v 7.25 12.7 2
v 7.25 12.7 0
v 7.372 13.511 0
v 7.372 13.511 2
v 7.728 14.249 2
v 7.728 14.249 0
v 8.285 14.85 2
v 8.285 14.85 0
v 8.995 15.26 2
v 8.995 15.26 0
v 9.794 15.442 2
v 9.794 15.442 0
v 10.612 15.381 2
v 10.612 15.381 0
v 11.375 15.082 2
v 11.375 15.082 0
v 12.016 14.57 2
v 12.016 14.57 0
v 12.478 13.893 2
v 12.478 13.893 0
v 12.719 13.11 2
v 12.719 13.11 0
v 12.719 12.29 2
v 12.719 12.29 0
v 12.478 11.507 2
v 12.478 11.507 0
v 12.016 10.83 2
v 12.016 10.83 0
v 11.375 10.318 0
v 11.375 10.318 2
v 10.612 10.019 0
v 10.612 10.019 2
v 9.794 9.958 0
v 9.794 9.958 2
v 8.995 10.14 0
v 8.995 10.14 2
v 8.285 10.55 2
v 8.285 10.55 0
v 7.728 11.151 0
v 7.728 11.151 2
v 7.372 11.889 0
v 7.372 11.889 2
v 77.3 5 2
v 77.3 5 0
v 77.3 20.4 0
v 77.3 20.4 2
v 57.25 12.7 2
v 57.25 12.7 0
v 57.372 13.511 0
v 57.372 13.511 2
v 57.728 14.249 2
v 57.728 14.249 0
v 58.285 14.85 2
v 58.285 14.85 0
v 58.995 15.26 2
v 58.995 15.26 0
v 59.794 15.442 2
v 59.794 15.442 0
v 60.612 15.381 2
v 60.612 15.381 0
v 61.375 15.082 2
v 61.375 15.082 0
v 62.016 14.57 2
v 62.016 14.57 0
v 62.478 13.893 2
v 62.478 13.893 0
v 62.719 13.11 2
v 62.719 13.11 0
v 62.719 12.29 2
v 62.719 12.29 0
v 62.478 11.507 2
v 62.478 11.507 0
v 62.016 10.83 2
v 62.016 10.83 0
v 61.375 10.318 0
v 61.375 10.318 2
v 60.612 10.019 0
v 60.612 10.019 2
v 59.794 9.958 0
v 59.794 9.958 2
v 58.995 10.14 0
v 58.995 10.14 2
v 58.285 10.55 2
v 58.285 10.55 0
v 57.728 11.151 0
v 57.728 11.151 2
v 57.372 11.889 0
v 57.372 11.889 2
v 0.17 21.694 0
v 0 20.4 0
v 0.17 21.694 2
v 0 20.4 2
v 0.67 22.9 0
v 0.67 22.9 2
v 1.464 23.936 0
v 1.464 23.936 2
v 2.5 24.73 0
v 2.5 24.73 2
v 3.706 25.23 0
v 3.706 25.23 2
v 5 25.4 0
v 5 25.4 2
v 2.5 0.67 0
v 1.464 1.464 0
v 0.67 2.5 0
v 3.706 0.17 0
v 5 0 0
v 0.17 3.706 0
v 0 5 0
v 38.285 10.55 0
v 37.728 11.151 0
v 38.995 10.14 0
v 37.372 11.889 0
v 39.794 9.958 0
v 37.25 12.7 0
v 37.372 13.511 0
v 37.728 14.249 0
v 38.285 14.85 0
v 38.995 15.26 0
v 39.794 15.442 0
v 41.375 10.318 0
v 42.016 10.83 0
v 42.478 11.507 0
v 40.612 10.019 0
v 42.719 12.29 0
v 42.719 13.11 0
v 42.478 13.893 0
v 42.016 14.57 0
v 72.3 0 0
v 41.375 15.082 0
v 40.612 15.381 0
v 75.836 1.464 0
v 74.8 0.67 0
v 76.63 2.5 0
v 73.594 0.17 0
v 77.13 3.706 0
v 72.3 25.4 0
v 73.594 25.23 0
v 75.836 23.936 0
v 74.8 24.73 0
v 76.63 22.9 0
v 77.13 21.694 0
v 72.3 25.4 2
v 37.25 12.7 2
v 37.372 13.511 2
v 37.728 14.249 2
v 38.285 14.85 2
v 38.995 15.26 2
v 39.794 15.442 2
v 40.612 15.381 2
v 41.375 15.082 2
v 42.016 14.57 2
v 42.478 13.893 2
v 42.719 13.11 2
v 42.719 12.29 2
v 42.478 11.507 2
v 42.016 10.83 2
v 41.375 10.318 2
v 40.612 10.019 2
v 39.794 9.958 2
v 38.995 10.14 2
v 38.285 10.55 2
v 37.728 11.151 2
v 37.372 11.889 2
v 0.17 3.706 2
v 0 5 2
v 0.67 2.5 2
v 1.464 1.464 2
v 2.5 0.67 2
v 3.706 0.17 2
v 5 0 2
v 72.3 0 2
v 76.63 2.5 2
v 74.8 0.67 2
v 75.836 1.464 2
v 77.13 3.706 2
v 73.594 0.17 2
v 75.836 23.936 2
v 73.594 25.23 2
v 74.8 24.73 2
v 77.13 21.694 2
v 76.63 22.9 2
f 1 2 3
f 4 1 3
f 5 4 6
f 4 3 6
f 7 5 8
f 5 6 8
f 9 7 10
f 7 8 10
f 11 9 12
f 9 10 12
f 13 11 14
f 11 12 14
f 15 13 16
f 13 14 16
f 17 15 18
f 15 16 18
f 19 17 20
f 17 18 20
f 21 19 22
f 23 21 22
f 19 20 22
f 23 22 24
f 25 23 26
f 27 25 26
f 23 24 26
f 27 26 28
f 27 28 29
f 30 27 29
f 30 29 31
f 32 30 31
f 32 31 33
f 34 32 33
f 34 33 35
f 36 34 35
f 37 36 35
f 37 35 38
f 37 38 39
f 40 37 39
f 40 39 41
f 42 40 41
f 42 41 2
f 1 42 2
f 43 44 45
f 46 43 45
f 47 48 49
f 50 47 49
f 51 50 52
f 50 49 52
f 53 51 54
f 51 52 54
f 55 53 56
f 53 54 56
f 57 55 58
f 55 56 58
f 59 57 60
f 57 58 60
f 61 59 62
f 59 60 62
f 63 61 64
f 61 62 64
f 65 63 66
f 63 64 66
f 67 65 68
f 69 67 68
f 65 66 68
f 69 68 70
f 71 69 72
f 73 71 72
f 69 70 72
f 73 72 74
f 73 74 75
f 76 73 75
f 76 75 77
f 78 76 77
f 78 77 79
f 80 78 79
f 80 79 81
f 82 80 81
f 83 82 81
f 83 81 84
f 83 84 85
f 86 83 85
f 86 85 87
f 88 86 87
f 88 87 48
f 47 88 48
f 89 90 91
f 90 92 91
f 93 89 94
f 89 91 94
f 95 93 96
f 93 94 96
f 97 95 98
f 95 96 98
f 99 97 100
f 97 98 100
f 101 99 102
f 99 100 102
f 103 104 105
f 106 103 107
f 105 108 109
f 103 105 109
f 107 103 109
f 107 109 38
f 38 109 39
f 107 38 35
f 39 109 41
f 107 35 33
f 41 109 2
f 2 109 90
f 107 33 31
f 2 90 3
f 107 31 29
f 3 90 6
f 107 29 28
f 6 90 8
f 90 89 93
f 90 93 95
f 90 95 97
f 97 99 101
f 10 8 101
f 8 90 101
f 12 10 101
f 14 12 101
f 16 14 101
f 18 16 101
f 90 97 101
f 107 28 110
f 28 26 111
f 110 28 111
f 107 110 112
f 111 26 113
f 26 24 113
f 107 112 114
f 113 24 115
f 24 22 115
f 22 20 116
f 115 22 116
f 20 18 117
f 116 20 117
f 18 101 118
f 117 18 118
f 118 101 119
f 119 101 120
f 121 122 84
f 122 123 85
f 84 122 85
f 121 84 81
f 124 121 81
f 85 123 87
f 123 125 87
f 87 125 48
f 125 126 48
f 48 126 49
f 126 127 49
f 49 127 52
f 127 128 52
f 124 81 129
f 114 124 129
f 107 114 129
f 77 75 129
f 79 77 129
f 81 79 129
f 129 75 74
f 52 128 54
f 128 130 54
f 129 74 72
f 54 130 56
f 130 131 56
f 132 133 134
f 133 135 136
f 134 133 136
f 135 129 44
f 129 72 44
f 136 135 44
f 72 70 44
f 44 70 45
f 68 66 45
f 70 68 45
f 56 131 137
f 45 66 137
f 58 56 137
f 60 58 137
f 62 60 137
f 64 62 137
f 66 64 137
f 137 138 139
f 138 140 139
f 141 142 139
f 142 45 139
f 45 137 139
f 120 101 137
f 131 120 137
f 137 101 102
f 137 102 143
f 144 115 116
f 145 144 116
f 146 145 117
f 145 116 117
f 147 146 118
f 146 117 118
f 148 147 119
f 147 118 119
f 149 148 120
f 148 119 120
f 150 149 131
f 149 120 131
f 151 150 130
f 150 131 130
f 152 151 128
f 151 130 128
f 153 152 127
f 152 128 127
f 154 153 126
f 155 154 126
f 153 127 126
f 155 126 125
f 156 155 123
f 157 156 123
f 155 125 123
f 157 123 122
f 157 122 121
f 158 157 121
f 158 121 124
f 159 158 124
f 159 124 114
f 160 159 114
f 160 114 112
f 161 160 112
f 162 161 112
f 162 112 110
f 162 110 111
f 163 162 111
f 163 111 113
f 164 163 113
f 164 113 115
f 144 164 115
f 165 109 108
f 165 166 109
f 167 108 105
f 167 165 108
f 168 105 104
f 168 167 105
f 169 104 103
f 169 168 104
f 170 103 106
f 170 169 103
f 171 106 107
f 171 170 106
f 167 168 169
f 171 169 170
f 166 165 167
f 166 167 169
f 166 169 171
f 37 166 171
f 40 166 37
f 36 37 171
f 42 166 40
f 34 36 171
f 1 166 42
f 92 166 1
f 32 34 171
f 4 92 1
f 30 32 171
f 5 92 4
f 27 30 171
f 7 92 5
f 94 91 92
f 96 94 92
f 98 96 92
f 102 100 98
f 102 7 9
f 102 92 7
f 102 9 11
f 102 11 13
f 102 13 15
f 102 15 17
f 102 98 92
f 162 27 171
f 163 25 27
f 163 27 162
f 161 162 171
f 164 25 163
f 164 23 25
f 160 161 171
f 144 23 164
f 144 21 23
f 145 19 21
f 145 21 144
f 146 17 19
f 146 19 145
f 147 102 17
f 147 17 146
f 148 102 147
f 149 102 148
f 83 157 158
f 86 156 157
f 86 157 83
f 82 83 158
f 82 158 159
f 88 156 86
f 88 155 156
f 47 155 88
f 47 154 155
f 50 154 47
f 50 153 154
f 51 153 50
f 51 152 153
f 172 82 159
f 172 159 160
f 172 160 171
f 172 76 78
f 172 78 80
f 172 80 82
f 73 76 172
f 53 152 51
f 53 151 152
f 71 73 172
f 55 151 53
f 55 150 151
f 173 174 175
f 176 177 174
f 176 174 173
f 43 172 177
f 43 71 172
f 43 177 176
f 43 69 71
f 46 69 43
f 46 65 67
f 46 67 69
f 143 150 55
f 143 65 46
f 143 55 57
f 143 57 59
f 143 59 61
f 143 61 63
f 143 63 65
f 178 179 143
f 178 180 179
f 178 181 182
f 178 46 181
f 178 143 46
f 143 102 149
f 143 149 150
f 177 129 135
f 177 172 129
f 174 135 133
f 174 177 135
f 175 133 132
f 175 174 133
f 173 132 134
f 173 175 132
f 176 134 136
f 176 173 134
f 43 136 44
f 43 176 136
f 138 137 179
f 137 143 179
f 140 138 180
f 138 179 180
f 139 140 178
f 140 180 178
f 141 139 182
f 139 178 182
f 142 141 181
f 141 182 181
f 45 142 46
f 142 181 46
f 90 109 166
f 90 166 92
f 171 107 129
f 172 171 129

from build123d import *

# Parameters (mm, degrees)
F0_W     = 77.3
F0_H     = 25.4
F1_DEPTH = 2
F3_D     = 5.5
F4_R     = 5


with BuildPart() as f1:
    # F0 (on Top) → F1 (new body)
    with BuildSketch(Plane.XY):
        with Locations((38.65, 12.7)):
            Rectangle(F0_W, F0_H)
    extrude(amount=F1_DEPTH)

    # F3 (through all)
    with Locations(Plane.XY.offset(2)):
        with Locations((10, 12.7), (40, 12.7), (60, 12.7)):
            Hole(F3_D / 2)

    # F4
    f4_edges = [f1.edges().sort_by_distance(p)[0] for p in [
        (0, 25.4, 1),
        (0, 0, 1),
        (77.3, 0, 1),
        (77.3, 25.4, 1),
    ]]
    fillet(f4_edges, radius=F4_R)


solid = f1.part
